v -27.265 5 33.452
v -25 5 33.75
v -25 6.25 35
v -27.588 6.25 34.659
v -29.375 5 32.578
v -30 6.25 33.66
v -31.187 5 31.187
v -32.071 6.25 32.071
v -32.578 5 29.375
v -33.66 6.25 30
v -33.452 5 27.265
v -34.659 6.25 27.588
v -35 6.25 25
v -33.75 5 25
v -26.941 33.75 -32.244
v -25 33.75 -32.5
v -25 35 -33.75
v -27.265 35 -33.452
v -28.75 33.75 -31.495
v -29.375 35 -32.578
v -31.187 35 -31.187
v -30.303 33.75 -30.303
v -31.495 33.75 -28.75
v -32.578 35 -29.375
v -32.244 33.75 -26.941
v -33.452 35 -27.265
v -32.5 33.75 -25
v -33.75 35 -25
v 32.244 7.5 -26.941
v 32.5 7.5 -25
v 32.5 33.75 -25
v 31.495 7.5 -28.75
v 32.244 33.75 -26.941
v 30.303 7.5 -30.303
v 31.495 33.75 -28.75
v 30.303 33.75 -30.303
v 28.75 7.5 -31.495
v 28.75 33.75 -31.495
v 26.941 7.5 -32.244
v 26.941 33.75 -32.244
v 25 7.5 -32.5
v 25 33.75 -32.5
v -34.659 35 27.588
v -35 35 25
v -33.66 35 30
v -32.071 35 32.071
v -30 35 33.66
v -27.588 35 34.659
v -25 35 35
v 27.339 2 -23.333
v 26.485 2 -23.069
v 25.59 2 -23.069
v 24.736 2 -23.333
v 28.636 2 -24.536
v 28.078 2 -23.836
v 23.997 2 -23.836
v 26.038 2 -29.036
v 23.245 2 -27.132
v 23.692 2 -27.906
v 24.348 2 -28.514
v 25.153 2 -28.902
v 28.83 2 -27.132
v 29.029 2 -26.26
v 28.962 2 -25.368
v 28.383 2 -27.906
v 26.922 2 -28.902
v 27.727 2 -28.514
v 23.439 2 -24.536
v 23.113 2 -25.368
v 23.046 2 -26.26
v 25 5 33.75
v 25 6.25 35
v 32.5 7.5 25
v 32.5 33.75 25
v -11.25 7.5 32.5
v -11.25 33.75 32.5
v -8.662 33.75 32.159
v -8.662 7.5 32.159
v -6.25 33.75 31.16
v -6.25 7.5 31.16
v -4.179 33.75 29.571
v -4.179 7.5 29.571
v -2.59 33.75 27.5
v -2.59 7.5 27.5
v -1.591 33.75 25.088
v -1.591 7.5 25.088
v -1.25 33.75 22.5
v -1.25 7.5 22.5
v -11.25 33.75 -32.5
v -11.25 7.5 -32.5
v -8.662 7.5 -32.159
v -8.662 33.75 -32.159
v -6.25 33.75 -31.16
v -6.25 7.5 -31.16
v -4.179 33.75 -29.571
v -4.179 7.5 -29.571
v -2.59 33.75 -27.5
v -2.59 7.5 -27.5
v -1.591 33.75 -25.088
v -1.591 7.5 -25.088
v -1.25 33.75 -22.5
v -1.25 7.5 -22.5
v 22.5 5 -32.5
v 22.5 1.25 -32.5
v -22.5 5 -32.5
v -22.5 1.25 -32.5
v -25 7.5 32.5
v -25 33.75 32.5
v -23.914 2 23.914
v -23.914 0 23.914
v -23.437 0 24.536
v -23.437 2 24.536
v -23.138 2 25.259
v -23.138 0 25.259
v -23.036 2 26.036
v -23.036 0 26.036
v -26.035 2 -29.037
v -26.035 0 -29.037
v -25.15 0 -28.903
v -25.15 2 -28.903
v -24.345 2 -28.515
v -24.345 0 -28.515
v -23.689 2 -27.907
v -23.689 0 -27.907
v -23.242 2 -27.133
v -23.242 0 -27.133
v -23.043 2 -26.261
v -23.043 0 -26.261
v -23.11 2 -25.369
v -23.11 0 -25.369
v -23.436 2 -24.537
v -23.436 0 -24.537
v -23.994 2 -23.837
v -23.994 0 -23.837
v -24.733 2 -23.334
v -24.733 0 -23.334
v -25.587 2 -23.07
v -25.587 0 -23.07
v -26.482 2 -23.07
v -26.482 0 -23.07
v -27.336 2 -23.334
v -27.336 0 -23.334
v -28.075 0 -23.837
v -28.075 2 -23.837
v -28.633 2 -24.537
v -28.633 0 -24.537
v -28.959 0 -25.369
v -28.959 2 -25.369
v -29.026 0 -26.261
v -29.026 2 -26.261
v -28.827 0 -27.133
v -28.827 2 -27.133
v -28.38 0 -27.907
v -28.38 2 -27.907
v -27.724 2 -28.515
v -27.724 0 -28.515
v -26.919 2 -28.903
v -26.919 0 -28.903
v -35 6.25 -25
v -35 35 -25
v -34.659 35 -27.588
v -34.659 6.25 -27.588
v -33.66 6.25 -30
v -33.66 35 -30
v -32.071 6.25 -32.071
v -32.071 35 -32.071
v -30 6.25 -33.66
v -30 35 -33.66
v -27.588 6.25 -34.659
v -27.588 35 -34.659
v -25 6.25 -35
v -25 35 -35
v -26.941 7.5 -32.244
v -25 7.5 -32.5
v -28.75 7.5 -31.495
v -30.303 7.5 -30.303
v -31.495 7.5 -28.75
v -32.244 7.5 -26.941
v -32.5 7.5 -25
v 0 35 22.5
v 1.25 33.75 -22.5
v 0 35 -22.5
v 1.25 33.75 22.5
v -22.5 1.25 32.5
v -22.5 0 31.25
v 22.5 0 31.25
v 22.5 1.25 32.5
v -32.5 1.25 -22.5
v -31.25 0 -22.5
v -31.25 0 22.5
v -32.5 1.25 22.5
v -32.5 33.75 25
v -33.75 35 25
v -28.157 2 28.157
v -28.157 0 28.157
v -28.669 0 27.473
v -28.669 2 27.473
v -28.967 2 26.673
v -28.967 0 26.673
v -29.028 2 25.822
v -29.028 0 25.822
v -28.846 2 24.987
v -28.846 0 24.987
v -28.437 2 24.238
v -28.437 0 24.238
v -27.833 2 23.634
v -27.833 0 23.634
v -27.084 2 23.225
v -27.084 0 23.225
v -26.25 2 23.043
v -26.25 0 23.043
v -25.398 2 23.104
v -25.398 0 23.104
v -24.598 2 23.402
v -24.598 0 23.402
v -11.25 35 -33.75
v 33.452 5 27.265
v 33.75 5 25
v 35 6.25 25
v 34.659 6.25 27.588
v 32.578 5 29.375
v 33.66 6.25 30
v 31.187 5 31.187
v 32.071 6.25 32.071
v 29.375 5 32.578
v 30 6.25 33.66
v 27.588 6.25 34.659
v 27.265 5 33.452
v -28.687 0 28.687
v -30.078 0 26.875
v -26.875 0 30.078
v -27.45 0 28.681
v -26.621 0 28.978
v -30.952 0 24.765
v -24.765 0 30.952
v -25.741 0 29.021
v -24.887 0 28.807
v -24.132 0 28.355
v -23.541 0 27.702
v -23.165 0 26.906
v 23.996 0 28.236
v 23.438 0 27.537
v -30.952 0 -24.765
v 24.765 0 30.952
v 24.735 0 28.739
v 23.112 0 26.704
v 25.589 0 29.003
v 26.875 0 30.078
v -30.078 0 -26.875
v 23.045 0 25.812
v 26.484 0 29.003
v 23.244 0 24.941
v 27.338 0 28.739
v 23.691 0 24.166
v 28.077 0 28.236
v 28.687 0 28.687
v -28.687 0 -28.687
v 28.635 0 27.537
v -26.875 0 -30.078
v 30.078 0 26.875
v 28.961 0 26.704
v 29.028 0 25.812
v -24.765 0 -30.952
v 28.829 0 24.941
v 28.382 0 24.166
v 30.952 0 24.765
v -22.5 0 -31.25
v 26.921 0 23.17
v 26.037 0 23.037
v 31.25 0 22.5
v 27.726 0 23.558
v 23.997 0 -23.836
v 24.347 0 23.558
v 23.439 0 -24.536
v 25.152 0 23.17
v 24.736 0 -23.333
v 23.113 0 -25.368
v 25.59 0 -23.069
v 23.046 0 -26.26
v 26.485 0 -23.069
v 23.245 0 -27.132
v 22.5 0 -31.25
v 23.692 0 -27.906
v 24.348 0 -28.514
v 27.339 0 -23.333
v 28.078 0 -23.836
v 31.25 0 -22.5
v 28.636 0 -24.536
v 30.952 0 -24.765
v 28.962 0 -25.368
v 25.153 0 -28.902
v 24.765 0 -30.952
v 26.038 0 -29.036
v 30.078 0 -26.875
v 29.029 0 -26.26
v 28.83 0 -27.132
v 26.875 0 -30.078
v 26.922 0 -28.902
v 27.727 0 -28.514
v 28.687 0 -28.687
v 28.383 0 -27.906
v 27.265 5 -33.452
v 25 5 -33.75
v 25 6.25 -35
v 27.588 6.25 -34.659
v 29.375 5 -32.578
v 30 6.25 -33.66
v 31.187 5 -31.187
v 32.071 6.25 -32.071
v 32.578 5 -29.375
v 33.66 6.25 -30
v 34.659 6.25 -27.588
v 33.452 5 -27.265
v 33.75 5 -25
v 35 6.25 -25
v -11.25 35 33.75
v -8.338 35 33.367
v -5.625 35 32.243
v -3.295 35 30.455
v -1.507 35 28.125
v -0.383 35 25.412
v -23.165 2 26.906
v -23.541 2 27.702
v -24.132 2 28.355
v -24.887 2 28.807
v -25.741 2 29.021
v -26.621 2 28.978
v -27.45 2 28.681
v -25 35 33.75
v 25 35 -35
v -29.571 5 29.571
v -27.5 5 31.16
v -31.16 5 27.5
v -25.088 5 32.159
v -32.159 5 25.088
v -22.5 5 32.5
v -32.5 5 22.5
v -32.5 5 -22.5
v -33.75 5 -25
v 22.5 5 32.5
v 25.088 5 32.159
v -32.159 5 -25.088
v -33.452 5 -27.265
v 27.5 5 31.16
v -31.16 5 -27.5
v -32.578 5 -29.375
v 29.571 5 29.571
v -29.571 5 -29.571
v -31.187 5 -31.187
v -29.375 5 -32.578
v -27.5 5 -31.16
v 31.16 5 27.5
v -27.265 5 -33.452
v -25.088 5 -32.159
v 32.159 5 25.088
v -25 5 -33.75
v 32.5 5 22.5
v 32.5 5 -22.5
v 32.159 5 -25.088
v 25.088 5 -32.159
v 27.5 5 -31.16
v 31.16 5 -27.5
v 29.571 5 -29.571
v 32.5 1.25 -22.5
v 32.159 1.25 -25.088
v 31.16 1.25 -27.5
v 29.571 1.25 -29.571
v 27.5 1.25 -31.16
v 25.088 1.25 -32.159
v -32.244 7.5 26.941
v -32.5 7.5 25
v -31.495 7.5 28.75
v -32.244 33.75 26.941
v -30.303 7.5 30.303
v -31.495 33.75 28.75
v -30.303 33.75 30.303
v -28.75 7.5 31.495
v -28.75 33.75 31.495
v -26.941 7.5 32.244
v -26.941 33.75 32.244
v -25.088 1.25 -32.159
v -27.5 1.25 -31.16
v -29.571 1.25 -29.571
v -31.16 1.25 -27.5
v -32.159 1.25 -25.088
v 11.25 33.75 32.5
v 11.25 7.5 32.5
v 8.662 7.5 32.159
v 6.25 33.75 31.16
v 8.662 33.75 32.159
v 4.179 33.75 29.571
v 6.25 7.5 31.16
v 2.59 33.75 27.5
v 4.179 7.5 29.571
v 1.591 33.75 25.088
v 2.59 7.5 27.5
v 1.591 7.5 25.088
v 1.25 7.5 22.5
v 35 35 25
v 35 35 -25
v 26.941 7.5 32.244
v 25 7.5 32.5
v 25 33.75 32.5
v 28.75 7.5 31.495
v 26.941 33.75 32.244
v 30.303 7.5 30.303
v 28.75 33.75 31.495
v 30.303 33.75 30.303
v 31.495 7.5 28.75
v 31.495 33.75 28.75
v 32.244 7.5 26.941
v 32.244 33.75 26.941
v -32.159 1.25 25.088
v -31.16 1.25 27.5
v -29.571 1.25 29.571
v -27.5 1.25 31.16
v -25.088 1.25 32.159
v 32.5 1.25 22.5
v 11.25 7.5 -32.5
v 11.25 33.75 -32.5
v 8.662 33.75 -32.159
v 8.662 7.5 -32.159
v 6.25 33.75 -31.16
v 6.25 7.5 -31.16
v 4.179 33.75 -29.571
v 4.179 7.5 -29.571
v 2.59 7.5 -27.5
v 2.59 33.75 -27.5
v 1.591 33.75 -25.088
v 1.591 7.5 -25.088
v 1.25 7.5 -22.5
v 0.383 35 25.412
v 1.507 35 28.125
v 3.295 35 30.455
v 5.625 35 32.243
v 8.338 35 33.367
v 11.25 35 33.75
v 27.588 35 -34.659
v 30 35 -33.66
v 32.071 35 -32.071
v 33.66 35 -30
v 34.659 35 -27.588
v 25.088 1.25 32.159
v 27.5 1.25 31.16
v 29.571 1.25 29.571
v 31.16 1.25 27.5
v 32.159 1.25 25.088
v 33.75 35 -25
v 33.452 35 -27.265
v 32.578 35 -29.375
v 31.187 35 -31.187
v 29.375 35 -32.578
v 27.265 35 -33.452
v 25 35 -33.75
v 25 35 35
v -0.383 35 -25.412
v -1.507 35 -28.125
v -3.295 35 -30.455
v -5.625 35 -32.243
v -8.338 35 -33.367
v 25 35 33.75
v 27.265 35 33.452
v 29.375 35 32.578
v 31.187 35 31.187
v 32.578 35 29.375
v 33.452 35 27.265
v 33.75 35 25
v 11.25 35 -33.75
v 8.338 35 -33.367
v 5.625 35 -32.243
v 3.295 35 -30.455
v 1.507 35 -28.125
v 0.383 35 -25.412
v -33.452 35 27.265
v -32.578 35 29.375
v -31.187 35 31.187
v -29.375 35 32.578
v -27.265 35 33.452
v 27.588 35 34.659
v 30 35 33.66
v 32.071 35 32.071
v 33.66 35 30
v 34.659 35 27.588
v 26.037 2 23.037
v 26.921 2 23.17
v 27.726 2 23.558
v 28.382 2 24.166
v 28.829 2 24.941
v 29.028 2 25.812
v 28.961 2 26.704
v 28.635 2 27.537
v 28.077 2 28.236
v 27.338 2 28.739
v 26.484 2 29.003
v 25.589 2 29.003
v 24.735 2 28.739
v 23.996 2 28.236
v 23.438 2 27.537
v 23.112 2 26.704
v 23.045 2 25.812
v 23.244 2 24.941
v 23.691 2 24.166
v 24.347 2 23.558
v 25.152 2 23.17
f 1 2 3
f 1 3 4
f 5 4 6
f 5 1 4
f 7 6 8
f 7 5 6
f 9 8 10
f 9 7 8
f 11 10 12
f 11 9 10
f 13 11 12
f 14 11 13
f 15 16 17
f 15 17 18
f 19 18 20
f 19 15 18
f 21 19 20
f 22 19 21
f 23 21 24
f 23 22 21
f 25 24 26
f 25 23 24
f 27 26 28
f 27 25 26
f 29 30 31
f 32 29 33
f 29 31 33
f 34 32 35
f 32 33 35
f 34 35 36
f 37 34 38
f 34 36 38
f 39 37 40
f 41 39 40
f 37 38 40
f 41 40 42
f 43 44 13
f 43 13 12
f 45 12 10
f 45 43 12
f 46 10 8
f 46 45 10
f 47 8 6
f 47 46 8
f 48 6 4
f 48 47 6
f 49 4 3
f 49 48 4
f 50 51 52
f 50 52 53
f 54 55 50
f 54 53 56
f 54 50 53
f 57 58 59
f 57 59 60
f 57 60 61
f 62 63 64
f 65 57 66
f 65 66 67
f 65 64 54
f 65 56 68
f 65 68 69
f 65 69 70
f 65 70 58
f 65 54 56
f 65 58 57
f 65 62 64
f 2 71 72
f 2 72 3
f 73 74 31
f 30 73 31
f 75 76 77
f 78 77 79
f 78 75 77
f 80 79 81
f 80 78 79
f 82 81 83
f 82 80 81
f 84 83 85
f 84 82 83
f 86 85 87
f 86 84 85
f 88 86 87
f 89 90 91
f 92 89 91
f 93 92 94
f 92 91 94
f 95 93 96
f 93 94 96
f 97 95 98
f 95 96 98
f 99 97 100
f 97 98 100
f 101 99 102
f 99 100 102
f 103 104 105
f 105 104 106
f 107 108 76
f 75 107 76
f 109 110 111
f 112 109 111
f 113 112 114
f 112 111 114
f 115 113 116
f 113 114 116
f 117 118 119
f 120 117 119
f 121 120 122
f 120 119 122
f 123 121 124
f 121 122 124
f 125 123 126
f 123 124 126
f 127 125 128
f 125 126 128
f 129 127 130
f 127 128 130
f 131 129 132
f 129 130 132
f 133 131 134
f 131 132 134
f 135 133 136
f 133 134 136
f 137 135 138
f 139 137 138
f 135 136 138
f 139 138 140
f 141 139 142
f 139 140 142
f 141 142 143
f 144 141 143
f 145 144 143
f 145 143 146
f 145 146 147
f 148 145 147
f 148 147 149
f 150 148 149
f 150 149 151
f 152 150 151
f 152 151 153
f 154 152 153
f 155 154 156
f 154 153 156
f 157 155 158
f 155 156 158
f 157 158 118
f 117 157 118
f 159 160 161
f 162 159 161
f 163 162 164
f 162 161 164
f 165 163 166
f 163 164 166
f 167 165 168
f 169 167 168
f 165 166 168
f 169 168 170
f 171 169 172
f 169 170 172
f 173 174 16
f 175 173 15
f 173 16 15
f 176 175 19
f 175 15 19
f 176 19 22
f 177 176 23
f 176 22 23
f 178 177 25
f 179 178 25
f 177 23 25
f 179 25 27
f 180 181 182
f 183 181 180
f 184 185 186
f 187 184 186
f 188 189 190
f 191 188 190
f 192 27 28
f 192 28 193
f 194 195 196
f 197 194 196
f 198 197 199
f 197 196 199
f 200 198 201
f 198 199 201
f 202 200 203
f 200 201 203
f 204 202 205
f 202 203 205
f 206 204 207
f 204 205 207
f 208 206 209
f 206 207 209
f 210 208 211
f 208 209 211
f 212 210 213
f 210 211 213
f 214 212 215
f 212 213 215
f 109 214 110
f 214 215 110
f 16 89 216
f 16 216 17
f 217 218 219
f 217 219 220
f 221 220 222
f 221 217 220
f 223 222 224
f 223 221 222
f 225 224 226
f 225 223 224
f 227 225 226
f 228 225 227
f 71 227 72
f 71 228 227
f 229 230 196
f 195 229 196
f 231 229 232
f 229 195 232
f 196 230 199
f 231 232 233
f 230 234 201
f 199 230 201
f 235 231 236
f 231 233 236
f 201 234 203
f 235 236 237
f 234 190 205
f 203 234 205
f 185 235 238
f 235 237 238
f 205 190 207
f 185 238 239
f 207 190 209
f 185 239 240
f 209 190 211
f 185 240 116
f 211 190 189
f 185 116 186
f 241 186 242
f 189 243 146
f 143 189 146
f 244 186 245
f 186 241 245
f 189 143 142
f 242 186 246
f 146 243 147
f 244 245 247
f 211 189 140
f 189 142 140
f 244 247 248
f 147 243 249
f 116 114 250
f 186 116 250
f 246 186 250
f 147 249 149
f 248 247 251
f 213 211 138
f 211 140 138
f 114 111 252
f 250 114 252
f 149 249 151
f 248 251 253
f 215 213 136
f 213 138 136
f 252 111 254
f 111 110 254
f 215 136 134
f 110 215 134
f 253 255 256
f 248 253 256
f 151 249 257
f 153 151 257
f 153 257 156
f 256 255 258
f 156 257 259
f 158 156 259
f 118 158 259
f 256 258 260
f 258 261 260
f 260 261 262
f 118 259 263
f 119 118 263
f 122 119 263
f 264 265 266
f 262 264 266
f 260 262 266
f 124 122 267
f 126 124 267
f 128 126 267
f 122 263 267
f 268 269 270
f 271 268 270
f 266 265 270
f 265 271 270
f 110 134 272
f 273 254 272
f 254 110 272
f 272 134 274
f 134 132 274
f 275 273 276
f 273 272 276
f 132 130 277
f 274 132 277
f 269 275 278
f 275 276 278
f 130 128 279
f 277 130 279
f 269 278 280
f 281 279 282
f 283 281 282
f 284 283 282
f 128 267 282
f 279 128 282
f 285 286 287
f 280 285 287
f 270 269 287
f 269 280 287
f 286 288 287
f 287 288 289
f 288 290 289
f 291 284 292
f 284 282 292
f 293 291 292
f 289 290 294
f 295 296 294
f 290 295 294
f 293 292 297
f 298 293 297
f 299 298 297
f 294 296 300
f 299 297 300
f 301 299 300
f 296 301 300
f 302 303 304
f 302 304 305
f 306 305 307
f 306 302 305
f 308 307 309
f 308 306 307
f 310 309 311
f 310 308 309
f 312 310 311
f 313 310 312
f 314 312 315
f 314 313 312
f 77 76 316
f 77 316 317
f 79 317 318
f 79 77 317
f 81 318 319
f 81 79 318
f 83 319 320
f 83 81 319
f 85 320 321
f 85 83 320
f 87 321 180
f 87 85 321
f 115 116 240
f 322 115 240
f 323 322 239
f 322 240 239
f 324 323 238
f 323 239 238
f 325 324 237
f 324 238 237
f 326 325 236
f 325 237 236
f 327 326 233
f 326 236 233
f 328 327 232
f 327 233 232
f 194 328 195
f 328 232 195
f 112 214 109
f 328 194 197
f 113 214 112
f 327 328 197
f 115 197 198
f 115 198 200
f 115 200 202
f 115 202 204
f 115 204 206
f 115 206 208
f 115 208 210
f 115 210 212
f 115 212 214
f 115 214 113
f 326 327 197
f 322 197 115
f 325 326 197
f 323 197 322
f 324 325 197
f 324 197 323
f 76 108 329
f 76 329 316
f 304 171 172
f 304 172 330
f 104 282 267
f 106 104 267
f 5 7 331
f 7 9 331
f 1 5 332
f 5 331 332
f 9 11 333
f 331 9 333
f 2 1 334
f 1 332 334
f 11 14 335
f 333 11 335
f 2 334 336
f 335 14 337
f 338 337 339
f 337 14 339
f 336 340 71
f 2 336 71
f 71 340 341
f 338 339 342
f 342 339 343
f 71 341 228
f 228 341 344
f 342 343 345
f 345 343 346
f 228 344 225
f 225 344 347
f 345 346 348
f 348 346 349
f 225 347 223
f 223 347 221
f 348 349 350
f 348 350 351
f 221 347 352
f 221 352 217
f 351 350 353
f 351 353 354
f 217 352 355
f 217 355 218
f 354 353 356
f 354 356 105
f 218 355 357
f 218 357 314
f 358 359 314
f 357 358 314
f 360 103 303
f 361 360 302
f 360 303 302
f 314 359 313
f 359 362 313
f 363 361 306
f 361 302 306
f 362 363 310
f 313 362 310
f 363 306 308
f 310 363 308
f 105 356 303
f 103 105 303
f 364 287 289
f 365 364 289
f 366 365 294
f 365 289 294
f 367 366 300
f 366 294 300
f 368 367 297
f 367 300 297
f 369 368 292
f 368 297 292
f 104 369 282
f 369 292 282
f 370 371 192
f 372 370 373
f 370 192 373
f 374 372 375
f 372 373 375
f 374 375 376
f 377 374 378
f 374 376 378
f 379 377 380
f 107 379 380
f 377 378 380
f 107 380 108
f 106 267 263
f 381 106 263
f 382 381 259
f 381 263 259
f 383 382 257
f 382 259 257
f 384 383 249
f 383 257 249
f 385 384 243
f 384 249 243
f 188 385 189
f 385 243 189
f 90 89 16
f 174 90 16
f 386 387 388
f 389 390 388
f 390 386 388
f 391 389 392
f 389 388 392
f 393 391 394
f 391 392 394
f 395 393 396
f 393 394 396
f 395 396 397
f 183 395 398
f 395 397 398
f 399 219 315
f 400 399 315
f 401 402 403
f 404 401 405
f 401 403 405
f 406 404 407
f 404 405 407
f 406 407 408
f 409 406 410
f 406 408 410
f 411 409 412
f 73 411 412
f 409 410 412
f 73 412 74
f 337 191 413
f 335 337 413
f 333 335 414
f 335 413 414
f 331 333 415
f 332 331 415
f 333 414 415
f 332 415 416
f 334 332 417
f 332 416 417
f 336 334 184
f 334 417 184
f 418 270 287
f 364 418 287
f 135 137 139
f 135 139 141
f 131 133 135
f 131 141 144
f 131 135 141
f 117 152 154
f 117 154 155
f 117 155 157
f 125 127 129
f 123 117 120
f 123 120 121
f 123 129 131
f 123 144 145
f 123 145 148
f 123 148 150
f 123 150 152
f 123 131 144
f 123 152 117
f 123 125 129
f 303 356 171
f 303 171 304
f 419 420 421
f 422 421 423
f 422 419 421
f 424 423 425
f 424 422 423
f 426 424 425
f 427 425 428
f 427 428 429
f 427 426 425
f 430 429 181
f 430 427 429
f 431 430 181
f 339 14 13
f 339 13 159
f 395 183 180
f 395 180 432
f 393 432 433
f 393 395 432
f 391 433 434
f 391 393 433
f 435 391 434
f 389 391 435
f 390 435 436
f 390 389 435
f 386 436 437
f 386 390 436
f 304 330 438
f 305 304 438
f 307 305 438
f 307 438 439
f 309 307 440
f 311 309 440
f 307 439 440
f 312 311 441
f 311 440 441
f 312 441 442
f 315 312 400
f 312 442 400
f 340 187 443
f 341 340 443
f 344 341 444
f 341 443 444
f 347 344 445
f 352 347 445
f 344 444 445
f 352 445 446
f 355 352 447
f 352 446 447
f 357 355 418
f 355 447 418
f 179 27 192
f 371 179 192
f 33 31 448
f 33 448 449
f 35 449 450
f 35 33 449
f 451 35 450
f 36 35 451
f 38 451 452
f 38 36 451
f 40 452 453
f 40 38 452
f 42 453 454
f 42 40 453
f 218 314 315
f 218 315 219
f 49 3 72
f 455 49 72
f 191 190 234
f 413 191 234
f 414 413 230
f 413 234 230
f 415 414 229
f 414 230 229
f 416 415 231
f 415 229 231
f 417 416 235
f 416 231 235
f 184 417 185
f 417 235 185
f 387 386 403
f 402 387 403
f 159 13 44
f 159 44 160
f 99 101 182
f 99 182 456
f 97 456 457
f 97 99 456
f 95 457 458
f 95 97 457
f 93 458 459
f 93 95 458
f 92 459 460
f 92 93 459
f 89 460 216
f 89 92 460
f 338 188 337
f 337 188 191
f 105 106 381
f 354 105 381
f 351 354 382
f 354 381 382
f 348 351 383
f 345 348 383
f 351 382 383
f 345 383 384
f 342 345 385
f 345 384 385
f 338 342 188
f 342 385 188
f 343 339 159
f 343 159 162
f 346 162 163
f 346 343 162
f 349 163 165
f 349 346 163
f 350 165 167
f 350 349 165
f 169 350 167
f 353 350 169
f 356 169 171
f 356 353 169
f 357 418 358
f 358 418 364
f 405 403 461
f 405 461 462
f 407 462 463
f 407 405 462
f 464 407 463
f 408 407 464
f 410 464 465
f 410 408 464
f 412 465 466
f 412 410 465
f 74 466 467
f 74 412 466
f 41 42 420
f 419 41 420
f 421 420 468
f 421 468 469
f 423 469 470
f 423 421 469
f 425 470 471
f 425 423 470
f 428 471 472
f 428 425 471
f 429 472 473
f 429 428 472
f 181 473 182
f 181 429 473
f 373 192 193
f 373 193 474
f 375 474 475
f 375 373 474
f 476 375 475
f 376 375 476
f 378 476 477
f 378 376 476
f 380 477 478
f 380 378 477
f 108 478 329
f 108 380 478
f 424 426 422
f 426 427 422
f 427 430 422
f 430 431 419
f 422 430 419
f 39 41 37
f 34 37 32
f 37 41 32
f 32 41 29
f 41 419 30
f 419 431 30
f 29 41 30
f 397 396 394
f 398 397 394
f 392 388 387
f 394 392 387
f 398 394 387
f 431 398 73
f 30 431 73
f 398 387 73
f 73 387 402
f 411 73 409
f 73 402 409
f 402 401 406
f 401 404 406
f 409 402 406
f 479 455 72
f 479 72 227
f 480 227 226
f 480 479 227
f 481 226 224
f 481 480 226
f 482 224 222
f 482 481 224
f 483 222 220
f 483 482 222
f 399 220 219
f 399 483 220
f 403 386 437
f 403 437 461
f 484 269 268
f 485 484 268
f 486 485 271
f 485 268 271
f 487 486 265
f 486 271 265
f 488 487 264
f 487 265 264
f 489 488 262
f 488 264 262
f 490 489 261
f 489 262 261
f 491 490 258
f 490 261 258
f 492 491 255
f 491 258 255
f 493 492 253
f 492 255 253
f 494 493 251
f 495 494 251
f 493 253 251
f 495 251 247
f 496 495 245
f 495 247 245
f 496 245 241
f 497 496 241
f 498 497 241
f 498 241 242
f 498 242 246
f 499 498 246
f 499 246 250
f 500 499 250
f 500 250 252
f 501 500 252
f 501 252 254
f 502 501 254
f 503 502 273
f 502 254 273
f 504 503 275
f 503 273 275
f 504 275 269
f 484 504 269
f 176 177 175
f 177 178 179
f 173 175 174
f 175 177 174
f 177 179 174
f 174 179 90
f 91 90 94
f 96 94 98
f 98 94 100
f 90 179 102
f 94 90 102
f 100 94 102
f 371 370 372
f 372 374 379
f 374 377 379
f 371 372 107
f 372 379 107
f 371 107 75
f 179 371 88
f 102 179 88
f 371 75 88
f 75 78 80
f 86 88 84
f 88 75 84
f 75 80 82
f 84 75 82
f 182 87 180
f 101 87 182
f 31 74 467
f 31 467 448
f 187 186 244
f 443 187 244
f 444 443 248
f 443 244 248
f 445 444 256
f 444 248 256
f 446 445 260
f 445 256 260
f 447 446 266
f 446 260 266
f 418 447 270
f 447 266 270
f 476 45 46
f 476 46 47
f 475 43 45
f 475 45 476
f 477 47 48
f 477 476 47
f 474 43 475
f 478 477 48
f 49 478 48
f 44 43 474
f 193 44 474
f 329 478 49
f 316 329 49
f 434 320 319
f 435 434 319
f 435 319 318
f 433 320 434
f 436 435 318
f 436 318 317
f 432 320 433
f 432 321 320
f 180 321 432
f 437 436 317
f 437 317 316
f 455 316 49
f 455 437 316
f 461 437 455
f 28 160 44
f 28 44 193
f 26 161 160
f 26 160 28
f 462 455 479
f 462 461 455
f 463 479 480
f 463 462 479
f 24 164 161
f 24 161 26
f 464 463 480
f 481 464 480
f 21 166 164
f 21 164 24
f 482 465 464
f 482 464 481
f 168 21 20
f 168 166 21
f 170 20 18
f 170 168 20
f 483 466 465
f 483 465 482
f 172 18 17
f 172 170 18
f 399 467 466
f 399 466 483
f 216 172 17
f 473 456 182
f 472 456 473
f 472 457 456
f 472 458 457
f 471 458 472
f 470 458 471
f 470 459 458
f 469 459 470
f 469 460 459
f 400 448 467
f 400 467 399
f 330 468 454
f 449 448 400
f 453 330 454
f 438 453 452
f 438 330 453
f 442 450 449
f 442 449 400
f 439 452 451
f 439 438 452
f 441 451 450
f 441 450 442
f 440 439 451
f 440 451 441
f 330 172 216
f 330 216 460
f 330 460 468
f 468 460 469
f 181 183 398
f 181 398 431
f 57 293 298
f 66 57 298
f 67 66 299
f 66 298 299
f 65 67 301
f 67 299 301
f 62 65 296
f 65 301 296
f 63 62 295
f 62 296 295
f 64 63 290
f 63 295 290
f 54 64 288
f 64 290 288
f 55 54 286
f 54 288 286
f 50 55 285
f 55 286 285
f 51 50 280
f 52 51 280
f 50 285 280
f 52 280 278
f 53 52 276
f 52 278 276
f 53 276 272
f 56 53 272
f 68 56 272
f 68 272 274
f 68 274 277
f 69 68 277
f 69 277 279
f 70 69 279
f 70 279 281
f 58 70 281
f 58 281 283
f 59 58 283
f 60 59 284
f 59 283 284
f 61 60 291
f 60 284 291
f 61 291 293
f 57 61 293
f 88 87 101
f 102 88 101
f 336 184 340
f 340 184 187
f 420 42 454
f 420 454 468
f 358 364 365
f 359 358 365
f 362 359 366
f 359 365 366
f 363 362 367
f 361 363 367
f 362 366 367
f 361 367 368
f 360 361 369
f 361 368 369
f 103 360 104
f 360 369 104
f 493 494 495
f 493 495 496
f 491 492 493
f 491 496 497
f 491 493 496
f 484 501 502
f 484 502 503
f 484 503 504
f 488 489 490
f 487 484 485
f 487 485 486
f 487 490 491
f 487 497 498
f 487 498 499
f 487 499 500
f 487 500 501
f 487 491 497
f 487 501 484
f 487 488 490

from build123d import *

# Parameters (mm, degrees)
BOSS_EXTRUDE4_DEPTH = 5
SKETCH6_W           = 70
SKETCH6_H           = 70
BOSS_EXTRUDE5_DEPTH = 30
SKETCH8_R           = 3
CUT_EXTRUDE1_DEPTH  = 2
FILLET1_R           = 10
CUT_EXTRUDE2_DEPTH  = 30
BOSS_EXTRUDE6_DEPTH = 2.5
SKETCH11_W          = 2.5
SKETCH11_H          = 65
BOSS_EXTRUDE7_DEPTH = 27.5
FILLET2_R           = 10
CHAMFER1_SIZE       = 1.25
CHAMFER2_SIZE       = 1.25


with BuildPart() as part:
    # Sketch5 → Boss-Extrude4 (new body)
    with BuildSketch(Plane(origin=(0, 0, 0), x_dir=(1, 0, 0), z_dir=(0, 1, 0))):
        with BuildLine():
            Line((-22.5, -32.5), (22.5, -32.5))
            ThreePointArc((22.5, -32.5), (29.571067812, -29.571067812), (32.5, -22.5))
            Line((32.5, -22.5), (32.5, 22.5))
            ThreePointArc((32.5, 22.5), (29.571067812, 29.571067812), (22.5, 32.5))
            Line((22.5, 32.5), (-22.5, 32.5))
            ThreePointArc((-22.5, 32.5), (-29.571067812, 29.571067812), (-32.5, 22.5))
            Line((-32.5, 22.5), (-32.5, -22.5))
            ThreePointArc((-32.5, -22.5), (-29.571067812, -29.571067812), (-22.5, -32.5))
        make_face()
    extrude(amount=BOSS_EXTRUDE4_DEPTH)

    # Sketch6 → Boss-Extrude5 (add)
    with BuildSketch(Plane(origin=(0, 5, 0), x_dir=(1, 0, 0), z_dir=(0, 1, 0))):
        Rectangle(SKETCH6_W, SKETCH6_H)
    extrude(amount=BOSS_EXTRUDE5_DEPTH)

    # Sketch8 → Cut-Extrude1 (cut)
    with BuildSketch(Plane.XZ):
        with Locations(Location((26.037533906, -26.035533906, 0), (0, 0, 270))):
            Circle(SKETCH8_R)
        with Locations(Location((26.036533906, 26.036533906, 0), (0, 0, 270))):
            Circle(SKETCH8_R)
        with BuildLine():
            ThreePointArc((-23.035533906, 26.035533906), (-24.887483609, 28.807172503), (-28.156854249, 28.156854249))
            Line((-28.156854249, 28.156854249), (-23.914213562, 23.914213562))
            ThreePointArc((-23.914213562, 23.914213562), (-23.263895308, 24.887483609), (-23.035533906, 26.035533906))
        make_face()
        with BuildLine():
            Line((-23.914213562, 23.914213562), (-28.156854249, 28.156854249))
            ThreePointArc((-28.156854249, 28.156854249), (-28.156854249, 23.914213562), (-23.914213562, 23.914213562))
        make_face()
        with Locations(Location((-26.034533906, -26.036533906, 0), (0, 0, 270))):
            Circle(SKETCH8_R)
    extrude(amount=-CUT_EXTRUDE1_DEPTH, mode=Mode.SUBTRACT)

    # Fillet1
    fillet1_edges = [part.edges().sort_by_distance(p)[0] for p in [
        (-35, 20, -35),
        (-35, 20, 35),
        (35, 20, 35),
        (35, 20, -35),
    ]]
    fillet(fillet1_edges, radius=FILLET1_R)

    # Sketch9 → Cut-Extrude2 (cut)
    with BuildSketch(Plane(origin=(0, 35, 0), x_dir=(1, 0, 0), z_dir=(0, 1, 0))):
        with BuildLine():
            Line((25, 32.5), (-25, 32.5))
            ThreePointArc((-25, 32.5), (-30.303300859, 30.303300859), (-32.5, 25))
            Line((-32.5, 25), (-32.5, -25))
            ThreePointArc((-32.5, -25), (-30.303300859, -30.303300859), (-25, -32.5))
            Line((-25, -32.5), (25, -32.5))
            ThreePointArc((25, -32.5), (30.303300859, -30.303300859), (32.5, -25))
            Line((32.5, -25), (32.5, 25))
            ThreePointArc((32.5, 25), (30.303300859, 30.303300859), (25, 32.5))
        make_face()
    extrude(amount=-CUT_EXTRUDE2_DEPTH, mode=Mode.SUBTRACT)


with BuildPart() as cut_extrude2_piece_1:
    # of the separate pieces the step leaves, piece 1, a body of its own (cut_extrude2_pieces)
    add(part.part.solids().sort_by_distance((-22.5, 0, 32.5))[0])



with BuildPart() as cut_extrude2_piece_2:
    # of the separate pieces the step leaves, piece 2, a body of its own (cut_extrude2_pieces)
    add(part.part.solids().sort_by_distance((25, 5, -35))[0])


with BuildPart() as cut_extrude2_piece_1_1:
    add(cut_extrude2_piece_1.part)

    add(cut_extrude2_piece_2.part)  # Boss-Extrude6 merges Cut-Extrude2 piece 2
    # Sketch10 → Boss-Extrude6 (add)
    with BuildSketch(Plane.XZ.offset(-5)):
        with BuildLine():
            Line((-35, 25), (-35, -25))
            ThreePointArc((-35, -25), (-32.071067812, -32.071067812), (-25, -35))
            Line((-25, -35), (25, -35))
            ThreePointArc((25, -35), (32.071067812, -32.071067812), (35, -25))
            Line((35, -25), (35, 25))
            ThreePointArc((35, 25), (32.071067812, 32.071067812), (25, 35))
            Line((25, 35), (-25, 35))
            ThreePointArc((-25, 35), (-32.071067812, 32.071067812), (-35, 25))
        make_face()
    extrude(amount=-BOSS_EXTRUDE6_DEPTH)

    # Sketch11 → Boss-Extrude7 (add)
    with BuildSketch(Plane(origin=(0, 35, 0), x_dir=(1, 0, 0), z_dir=(0, 1, 0))):
        Rectangle(SKETCH11_W, SKETCH11_H)
    extrude(amount=-BOSS_EXTRUDE7_DEPTH)

    # Fillet2
    fillet2_edges = [cut_extrude2_piece_1_1.edges().sort_by_distance(p)[0] for p in [
        (-1.25, 21.25, -32.5),
        (-1.25, 21.25, 32.5),
        (1.25, 21.25, 32.5),
        (1.25, 21.25, -32.5),
    ]]
    fillet(fillet2_edges, radius=FILLET2_R)

    # Chamfer1
    chamfer1_edges = [cut_extrude2_piece_1_1.edges().sort_by_distance(p)[0] for p in [
        (18.125, 35, -32.5),
        (-30.303300859, 35, -30.303300859),
        (-32.5, 35, 0),
        (-30.303300859, 35, 30.303300859),
        (-18.125, 35, 32.5),
        (30.303300859, 35, 30.303300859),
        (32.5, 35, 0),
        (1.25, 35, 0),
        (18.125, 35, 32.5),
        (-1.25, 35, 0),
        (-18.125, 35, -32.5),
        (4.178932188, 35, -29.571067812),
        (4.178932188, 35, 29.571067812),
        (-4.178932188, 35, 29.571067812),
        (-4.178932188, 35, -29.571067812),
        (30.303300859, 35, -30.303300859),
    ]]
    chamfer(chamfer1_edges, length=CHAMFER1_SIZE - 0.0001)  # a hair under: the kernel refuses the full size

    # Chamfer2
    chamfer2_edges = [cut_extrude2_piece_1_1.edges().sort_by_distance(p)[0] for p in [
        (-29.571067812, 0, 29.571067812),
        (0, 0, 32.5),
        (29.571067812, 0, 29.571067812),
        (32.5, 0, 0),
        (29.571067812, 0, -29.571067812),
        (0, 0, -32.5),
        (-29.571067812, 0, -29.571067812),
        (-32.5, 0, 0),
        (-35, 5, 0),
        (0, 5, -35),
        (35, 5, 0),
        (0, 5, 35),
        (32.071067812, 5, -32.071067812),
        (32.071067812, 5, 32.071067812),
        (-32.071067812, 5, 32.071067812),
        (-32.071067812, 5, -32.071067812),
    ]]
    chamfer(chamfer2_edges, length=CHAMFER2_SIZE)


solid = cut_extrude2_piece_1_1.part
